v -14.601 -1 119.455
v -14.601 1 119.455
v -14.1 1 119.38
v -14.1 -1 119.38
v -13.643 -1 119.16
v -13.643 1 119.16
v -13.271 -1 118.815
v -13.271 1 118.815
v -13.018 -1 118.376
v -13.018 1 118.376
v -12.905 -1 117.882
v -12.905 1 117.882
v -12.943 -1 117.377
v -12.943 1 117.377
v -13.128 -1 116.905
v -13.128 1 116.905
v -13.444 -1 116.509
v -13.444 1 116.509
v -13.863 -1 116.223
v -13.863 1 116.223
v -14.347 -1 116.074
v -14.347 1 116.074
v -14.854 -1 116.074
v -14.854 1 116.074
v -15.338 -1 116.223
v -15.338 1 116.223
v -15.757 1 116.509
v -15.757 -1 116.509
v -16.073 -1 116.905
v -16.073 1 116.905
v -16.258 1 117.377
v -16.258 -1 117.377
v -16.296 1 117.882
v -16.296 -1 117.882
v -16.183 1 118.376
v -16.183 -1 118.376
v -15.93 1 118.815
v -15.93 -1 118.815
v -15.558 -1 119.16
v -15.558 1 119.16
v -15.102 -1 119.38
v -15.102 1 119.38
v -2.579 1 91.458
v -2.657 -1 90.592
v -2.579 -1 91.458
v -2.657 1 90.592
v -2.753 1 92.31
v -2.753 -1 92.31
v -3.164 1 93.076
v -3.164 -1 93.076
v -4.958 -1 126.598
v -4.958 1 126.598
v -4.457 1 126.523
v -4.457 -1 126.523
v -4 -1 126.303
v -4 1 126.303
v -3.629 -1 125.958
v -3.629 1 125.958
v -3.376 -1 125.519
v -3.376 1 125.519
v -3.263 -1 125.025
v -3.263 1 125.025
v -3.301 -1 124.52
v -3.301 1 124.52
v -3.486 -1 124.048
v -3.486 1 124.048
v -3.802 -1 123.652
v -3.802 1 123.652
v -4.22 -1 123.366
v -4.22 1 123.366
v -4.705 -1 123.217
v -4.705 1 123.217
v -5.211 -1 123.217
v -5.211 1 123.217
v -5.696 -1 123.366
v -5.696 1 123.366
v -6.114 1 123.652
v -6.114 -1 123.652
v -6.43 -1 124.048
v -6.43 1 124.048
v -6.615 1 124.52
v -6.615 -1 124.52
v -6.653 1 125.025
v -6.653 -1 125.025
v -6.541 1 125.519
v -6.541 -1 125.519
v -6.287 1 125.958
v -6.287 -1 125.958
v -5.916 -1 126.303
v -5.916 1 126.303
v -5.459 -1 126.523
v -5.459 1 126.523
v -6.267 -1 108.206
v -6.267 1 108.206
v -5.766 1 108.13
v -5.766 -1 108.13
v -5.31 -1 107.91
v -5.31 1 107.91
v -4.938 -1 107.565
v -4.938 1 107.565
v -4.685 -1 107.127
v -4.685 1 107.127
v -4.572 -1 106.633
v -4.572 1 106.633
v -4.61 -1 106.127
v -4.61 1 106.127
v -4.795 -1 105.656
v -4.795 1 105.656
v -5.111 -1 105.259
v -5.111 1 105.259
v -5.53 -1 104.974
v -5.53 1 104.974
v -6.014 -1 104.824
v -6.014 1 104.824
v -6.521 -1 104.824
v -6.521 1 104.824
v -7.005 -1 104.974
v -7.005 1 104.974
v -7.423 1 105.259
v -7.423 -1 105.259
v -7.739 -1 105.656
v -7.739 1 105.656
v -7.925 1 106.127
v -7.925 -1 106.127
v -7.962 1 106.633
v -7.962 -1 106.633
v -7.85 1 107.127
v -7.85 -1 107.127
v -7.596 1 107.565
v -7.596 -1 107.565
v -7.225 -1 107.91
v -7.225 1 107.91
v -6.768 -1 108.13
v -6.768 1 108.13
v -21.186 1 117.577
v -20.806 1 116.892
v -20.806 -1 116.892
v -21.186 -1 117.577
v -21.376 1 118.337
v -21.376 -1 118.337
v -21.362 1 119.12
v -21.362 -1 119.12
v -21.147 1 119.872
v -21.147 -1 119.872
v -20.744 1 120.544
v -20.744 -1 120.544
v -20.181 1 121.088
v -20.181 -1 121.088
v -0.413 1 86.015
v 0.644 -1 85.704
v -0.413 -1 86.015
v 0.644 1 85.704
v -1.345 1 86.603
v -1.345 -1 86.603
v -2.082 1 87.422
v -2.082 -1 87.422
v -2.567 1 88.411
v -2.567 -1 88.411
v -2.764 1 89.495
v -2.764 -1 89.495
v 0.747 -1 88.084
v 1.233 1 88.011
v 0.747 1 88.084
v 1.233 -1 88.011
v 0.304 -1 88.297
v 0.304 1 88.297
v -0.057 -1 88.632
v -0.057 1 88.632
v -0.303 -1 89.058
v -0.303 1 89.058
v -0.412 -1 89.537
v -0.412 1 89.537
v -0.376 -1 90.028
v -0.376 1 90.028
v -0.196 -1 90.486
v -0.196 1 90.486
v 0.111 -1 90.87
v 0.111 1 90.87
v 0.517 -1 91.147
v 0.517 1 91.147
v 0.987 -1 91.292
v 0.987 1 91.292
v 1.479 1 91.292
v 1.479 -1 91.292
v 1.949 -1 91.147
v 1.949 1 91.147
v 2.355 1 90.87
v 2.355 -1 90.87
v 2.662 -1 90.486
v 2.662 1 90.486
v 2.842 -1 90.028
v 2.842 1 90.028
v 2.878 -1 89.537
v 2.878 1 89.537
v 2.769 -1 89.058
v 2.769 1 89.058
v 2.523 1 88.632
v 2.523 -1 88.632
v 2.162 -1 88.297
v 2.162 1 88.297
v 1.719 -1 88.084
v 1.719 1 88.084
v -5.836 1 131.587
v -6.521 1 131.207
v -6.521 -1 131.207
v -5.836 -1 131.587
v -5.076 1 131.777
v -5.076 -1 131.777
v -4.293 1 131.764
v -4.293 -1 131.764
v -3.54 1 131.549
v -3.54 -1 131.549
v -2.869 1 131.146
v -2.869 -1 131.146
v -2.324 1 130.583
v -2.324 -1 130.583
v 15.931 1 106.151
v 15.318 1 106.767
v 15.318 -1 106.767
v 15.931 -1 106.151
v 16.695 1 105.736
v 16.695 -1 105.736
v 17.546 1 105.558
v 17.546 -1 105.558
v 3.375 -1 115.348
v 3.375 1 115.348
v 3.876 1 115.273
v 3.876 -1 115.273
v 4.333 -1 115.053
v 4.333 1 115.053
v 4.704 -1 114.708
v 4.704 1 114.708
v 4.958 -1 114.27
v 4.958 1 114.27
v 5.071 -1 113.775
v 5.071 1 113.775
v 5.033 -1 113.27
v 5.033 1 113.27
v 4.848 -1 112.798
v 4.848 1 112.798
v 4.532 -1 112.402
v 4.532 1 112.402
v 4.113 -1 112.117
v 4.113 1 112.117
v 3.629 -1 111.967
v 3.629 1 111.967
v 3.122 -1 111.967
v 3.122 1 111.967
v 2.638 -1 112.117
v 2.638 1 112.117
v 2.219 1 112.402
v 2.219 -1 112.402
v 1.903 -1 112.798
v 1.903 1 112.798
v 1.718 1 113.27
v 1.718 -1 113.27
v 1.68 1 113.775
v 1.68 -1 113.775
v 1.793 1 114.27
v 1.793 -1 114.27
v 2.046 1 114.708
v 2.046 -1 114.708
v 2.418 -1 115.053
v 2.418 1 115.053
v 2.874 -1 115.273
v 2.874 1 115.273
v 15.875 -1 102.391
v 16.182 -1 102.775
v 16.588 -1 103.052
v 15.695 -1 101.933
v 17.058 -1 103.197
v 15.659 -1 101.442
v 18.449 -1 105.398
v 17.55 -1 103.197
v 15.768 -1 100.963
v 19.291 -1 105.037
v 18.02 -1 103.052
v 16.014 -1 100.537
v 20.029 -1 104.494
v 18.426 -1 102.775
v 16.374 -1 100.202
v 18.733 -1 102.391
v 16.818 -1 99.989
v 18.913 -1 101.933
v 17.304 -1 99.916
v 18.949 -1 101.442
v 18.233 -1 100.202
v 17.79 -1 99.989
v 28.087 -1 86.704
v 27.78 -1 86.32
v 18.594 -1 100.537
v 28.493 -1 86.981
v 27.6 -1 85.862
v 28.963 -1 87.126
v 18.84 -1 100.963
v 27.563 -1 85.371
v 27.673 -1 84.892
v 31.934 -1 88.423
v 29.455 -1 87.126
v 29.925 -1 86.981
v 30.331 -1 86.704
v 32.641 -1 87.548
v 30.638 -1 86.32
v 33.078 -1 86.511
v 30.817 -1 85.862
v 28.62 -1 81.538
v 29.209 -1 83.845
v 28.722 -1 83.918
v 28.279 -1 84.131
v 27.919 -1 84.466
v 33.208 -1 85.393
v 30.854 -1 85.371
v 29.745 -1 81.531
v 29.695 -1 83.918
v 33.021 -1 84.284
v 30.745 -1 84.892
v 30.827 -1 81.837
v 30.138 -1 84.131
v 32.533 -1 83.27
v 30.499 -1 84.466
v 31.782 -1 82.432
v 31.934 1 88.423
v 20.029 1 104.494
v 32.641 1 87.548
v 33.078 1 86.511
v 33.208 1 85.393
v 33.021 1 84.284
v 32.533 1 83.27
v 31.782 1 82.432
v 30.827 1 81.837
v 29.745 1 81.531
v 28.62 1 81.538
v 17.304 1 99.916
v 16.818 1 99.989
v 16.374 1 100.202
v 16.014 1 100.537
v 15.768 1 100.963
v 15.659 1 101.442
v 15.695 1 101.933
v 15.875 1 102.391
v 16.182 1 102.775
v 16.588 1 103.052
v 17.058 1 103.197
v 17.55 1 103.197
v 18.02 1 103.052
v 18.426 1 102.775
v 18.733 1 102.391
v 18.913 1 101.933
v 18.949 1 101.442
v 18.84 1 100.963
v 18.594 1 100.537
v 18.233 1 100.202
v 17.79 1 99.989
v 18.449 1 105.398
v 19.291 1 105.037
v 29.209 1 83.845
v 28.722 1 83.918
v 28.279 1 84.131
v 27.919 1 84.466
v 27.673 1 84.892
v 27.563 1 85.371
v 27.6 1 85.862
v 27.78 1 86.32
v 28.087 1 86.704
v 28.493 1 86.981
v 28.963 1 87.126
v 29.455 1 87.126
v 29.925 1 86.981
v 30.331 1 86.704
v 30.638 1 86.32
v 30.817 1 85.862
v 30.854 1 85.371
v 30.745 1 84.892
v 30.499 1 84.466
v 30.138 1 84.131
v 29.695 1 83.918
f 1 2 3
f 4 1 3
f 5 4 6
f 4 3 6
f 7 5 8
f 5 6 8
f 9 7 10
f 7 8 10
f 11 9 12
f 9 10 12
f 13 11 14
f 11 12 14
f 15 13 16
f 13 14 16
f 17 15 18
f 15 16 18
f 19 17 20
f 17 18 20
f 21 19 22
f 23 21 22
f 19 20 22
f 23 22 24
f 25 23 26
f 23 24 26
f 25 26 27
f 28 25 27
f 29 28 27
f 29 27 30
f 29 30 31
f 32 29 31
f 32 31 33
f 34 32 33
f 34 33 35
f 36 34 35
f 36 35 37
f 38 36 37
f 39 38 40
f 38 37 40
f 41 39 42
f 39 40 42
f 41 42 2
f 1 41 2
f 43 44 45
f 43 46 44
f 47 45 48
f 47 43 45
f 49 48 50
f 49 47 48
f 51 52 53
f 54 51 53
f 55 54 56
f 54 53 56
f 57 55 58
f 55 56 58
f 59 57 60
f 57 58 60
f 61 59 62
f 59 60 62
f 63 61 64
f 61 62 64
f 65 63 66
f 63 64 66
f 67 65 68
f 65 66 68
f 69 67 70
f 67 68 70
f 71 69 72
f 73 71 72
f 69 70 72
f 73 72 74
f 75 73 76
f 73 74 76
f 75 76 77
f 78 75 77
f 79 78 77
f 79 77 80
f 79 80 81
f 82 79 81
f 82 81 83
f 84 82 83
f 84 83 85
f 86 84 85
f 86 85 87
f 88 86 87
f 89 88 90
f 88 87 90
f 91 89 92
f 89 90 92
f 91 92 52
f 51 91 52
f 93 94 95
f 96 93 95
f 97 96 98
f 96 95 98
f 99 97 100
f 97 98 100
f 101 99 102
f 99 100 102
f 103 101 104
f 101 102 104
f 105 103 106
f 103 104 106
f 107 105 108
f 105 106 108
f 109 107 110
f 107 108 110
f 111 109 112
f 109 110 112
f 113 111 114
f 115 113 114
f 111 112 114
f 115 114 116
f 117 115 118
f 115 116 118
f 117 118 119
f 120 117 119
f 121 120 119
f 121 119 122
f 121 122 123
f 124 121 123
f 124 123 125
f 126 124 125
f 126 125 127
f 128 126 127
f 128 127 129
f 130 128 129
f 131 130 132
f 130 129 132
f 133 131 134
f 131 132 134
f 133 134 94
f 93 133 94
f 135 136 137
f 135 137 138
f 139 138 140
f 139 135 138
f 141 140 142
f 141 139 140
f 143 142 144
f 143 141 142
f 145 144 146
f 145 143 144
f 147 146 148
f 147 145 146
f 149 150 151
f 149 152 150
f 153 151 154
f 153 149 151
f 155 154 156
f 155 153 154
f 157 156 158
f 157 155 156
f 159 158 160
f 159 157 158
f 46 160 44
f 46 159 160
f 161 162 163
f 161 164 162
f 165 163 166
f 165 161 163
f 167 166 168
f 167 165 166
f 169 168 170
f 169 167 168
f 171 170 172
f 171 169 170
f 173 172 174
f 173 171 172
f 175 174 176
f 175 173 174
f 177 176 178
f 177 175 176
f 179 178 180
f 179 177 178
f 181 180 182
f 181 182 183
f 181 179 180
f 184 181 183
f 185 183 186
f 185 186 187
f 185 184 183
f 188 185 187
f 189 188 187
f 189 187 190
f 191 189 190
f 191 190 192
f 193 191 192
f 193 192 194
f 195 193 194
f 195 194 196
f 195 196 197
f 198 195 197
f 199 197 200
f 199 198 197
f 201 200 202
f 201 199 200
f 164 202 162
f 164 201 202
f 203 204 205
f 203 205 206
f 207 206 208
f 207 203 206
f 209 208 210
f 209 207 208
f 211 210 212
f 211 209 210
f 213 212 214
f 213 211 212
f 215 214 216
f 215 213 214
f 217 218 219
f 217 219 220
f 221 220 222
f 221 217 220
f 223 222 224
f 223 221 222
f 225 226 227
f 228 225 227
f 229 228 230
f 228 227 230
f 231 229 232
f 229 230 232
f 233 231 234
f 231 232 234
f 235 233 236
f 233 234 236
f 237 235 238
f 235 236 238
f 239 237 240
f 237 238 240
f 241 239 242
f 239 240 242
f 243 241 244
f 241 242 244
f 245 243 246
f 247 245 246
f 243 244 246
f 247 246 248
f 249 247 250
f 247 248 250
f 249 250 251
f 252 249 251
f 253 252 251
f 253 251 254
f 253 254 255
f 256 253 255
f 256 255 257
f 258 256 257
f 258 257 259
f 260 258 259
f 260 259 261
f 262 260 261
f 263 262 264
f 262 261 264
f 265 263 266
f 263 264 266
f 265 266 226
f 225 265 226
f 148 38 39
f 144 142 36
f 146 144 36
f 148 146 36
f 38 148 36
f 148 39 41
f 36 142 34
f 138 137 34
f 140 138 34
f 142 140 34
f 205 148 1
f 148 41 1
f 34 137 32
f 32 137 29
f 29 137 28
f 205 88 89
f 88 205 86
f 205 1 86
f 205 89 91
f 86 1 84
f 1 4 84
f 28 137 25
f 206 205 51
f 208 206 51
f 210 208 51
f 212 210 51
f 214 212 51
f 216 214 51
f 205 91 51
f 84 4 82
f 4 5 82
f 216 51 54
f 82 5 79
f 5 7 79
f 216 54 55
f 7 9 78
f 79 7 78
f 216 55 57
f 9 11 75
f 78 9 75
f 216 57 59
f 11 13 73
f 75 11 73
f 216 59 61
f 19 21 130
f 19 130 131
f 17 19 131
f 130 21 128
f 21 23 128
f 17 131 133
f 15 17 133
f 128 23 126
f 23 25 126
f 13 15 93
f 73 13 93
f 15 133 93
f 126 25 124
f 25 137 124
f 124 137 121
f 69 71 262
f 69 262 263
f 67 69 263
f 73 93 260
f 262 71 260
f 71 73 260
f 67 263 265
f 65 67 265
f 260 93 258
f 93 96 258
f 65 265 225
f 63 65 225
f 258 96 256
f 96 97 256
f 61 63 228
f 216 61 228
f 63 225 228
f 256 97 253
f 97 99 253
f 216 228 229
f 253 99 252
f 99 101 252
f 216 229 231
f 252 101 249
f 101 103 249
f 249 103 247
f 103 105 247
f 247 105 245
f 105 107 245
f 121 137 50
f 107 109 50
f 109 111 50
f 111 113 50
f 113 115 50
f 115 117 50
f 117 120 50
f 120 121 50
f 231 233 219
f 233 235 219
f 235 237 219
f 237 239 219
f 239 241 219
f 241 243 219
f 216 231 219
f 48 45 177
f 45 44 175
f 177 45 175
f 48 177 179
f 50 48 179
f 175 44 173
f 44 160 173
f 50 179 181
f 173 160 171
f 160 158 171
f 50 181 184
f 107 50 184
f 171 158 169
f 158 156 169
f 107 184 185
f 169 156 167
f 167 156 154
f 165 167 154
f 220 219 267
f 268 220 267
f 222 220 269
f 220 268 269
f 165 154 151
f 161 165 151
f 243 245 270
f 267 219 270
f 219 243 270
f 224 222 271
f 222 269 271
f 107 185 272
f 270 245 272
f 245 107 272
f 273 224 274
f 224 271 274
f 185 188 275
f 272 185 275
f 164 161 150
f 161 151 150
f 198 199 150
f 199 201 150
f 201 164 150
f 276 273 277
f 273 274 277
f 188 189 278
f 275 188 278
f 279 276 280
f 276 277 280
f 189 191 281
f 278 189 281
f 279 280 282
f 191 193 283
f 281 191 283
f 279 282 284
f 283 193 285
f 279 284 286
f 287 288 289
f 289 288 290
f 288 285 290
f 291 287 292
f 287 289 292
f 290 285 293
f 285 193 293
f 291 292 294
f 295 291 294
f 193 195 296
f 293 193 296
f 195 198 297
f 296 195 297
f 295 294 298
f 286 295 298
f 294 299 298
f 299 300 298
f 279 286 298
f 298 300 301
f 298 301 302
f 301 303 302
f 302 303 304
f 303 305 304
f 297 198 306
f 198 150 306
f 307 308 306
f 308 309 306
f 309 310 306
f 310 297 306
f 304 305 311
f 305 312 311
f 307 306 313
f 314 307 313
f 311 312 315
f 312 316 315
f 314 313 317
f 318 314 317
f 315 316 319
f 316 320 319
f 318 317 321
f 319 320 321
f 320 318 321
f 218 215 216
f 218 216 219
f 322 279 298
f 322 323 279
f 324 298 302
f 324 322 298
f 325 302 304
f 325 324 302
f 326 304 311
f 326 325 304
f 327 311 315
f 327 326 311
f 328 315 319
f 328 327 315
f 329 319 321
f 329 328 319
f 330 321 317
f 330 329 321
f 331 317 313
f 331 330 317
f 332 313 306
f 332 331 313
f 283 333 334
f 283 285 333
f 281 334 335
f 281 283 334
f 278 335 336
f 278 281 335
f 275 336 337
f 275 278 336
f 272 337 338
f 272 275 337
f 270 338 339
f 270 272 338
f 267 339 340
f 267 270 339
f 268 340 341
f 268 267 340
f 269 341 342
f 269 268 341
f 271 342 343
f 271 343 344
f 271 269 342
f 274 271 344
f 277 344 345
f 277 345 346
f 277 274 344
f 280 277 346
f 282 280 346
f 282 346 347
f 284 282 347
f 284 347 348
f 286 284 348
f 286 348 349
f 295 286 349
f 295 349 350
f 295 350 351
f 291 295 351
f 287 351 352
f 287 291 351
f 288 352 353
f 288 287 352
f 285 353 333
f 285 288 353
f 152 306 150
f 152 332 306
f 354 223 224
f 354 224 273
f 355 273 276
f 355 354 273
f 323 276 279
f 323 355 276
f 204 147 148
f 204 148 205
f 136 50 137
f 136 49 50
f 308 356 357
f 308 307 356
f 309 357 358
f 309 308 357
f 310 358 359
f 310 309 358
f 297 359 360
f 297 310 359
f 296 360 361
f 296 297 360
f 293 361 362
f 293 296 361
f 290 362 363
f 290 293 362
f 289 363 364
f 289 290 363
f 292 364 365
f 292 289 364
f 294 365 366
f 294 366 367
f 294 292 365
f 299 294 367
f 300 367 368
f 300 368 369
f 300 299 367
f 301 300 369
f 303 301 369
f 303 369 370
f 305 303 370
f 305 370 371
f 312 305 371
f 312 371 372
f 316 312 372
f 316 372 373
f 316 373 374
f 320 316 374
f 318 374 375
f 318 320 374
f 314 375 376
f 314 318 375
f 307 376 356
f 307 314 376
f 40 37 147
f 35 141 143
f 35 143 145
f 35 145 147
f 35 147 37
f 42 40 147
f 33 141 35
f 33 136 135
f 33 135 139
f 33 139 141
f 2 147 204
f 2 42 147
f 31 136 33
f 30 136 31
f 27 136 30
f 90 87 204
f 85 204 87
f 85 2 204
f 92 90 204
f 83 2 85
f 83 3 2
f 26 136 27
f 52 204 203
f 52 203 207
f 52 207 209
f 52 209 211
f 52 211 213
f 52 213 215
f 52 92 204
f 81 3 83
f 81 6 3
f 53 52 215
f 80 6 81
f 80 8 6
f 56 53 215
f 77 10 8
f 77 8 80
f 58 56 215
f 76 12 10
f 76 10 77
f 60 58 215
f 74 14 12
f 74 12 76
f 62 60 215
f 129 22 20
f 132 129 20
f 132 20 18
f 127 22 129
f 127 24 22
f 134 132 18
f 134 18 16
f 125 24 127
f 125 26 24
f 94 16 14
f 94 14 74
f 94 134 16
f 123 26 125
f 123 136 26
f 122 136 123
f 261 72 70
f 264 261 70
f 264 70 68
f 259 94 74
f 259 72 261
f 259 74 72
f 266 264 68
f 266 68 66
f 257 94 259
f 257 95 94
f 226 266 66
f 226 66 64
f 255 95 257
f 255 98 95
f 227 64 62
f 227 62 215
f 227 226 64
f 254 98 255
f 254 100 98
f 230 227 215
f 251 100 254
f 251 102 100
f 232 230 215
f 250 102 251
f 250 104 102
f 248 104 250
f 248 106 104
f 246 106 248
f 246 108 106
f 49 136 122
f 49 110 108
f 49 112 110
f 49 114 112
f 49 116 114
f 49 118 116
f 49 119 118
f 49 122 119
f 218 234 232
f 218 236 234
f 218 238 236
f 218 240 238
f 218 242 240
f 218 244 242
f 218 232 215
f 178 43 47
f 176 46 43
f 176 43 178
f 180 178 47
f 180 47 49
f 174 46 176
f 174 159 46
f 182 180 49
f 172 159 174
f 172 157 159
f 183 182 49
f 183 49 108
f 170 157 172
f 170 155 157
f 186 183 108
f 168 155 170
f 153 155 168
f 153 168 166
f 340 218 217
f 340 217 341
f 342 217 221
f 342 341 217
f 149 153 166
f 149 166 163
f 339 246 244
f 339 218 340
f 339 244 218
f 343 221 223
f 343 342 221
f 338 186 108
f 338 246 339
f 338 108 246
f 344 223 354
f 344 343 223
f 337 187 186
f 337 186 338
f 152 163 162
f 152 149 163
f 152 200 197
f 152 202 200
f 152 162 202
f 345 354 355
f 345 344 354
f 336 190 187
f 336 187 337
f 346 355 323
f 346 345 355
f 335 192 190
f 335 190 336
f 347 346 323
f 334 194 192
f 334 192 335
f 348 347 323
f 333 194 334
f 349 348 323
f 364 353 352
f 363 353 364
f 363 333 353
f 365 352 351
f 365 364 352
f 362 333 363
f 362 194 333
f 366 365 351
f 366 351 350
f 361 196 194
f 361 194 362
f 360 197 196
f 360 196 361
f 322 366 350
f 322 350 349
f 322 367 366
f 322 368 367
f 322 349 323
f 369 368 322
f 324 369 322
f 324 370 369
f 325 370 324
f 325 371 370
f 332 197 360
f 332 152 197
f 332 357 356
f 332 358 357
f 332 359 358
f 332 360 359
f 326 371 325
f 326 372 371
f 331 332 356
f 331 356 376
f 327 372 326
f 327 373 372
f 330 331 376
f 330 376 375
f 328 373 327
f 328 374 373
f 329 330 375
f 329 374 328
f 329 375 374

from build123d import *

# Parameters (mm, degrees)
SKETCH1_R           = 1.650000007
BOSS_EXTRUDE1_DEPTH = 1
SKETCH9_R           = 1.7
CUT_EXTRUDE3_DEPTH  = 2


with BuildPart() as part:
    # Sketch1 → Boss-Extrude1 (new, symmetric)
    with BuildSketch(Plane(origin=(0, 0, 0), x_dir=(1, 0, 0), z_dir=(0, 1, 0))):
        with BuildLine():
            Line((-3.163944782, -93.076388076), (-20.805834618, -116.891940565))
            ThreePointArc((-20.805834618, -116.891940565), (-21.362478255, -119.119545961), (-20.180929864, -121.088307332))
            Line((-20.180929864, -121.088307332), (-6.520660553, -131.207449705))
            ThreePointArc((-6.520660553, -131.207449705), (-4.293055157, -131.764093342), (-2.324293786, -130.582544951))
            Line((-2.324293786, -130.582544951), (15.317595998, -106.766992534))
            ThreePointArc((15.317595998, -106.766992534), (16.298016652, -105.915587831), (17.546382486, -105.558240139))
            ThreePointArc((17.546382486, -105.558240139), (18.880171652, -105.241928098), (20.028844772, -104.493865997))
            Line((20.028844772, -104.493865997), (31.933718152, -88.422960925))
            ThreePointArc((31.933718152, -88.422960925), (32.812947077, -83.759740105), (28.619624318, -81.538318002))
            Line((28.619624318, -81.538318002), (0.643845867, -85.704349694))
            ThreePointArc((0.643845867, -85.704349694), (-2.081865152, -87.422063847), (-2.657041002, -90.592113564))
            ThreePointArc((-2.657041002, -90.592113564), (-2.635147269, -91.890433717), (-3.163944782, -93.076388076))
        make_face()
        with Locations(Location((1.233011719, -89.660722224, 0), (0, 0, 90))):
            Circle(SKETCH1_R, mode=Mode.SUBTRACT)
        with Locations(Location((29.20879017, -85.494690532, 0), (0, 0, 90))):
            Circle(SKETCH1_R, mode=Mode.SUBTRACT)
        with Locations(Location((17.30391679, -101.565595604, 0), (0, 0, 90))):
            Circle(SKETCH1_R, mode=Mode.SUBTRACT)
    extrude(amount=BOSS_EXTRUDE1_DEPTH, both=True)

    # Sketch9 → Cut-Extrude3 (cut)
    with BuildSketch(Plane(origin=(0, 1, 0), x_dir=(1, 0, 0), z_dir=(0, 1, 0))):
        with Locations(Location((-6.267193351, -106.505511433, 0), (0, 0, 270))):
            Circle(SKETCH9_R)
        with Locations(Location((-14.600604716, -117.755144983, 0), (0, 0, 270))):
            Circle(SKETCH9_R)
        with Locations(Location((-4.958061673, -124.898069011, 0), (0, 0, 270))):
            Circle(SKETCH9_R)
        with Locations(Location((3.375349692, -113.648435461, 0), (0, 0, 270))):
            Circle(SKETCH9_R)
    extrude(amount=-CUT_EXTRUDE3_DEPTH, mode=Mode.SUBTRACT)


solid = part.part
